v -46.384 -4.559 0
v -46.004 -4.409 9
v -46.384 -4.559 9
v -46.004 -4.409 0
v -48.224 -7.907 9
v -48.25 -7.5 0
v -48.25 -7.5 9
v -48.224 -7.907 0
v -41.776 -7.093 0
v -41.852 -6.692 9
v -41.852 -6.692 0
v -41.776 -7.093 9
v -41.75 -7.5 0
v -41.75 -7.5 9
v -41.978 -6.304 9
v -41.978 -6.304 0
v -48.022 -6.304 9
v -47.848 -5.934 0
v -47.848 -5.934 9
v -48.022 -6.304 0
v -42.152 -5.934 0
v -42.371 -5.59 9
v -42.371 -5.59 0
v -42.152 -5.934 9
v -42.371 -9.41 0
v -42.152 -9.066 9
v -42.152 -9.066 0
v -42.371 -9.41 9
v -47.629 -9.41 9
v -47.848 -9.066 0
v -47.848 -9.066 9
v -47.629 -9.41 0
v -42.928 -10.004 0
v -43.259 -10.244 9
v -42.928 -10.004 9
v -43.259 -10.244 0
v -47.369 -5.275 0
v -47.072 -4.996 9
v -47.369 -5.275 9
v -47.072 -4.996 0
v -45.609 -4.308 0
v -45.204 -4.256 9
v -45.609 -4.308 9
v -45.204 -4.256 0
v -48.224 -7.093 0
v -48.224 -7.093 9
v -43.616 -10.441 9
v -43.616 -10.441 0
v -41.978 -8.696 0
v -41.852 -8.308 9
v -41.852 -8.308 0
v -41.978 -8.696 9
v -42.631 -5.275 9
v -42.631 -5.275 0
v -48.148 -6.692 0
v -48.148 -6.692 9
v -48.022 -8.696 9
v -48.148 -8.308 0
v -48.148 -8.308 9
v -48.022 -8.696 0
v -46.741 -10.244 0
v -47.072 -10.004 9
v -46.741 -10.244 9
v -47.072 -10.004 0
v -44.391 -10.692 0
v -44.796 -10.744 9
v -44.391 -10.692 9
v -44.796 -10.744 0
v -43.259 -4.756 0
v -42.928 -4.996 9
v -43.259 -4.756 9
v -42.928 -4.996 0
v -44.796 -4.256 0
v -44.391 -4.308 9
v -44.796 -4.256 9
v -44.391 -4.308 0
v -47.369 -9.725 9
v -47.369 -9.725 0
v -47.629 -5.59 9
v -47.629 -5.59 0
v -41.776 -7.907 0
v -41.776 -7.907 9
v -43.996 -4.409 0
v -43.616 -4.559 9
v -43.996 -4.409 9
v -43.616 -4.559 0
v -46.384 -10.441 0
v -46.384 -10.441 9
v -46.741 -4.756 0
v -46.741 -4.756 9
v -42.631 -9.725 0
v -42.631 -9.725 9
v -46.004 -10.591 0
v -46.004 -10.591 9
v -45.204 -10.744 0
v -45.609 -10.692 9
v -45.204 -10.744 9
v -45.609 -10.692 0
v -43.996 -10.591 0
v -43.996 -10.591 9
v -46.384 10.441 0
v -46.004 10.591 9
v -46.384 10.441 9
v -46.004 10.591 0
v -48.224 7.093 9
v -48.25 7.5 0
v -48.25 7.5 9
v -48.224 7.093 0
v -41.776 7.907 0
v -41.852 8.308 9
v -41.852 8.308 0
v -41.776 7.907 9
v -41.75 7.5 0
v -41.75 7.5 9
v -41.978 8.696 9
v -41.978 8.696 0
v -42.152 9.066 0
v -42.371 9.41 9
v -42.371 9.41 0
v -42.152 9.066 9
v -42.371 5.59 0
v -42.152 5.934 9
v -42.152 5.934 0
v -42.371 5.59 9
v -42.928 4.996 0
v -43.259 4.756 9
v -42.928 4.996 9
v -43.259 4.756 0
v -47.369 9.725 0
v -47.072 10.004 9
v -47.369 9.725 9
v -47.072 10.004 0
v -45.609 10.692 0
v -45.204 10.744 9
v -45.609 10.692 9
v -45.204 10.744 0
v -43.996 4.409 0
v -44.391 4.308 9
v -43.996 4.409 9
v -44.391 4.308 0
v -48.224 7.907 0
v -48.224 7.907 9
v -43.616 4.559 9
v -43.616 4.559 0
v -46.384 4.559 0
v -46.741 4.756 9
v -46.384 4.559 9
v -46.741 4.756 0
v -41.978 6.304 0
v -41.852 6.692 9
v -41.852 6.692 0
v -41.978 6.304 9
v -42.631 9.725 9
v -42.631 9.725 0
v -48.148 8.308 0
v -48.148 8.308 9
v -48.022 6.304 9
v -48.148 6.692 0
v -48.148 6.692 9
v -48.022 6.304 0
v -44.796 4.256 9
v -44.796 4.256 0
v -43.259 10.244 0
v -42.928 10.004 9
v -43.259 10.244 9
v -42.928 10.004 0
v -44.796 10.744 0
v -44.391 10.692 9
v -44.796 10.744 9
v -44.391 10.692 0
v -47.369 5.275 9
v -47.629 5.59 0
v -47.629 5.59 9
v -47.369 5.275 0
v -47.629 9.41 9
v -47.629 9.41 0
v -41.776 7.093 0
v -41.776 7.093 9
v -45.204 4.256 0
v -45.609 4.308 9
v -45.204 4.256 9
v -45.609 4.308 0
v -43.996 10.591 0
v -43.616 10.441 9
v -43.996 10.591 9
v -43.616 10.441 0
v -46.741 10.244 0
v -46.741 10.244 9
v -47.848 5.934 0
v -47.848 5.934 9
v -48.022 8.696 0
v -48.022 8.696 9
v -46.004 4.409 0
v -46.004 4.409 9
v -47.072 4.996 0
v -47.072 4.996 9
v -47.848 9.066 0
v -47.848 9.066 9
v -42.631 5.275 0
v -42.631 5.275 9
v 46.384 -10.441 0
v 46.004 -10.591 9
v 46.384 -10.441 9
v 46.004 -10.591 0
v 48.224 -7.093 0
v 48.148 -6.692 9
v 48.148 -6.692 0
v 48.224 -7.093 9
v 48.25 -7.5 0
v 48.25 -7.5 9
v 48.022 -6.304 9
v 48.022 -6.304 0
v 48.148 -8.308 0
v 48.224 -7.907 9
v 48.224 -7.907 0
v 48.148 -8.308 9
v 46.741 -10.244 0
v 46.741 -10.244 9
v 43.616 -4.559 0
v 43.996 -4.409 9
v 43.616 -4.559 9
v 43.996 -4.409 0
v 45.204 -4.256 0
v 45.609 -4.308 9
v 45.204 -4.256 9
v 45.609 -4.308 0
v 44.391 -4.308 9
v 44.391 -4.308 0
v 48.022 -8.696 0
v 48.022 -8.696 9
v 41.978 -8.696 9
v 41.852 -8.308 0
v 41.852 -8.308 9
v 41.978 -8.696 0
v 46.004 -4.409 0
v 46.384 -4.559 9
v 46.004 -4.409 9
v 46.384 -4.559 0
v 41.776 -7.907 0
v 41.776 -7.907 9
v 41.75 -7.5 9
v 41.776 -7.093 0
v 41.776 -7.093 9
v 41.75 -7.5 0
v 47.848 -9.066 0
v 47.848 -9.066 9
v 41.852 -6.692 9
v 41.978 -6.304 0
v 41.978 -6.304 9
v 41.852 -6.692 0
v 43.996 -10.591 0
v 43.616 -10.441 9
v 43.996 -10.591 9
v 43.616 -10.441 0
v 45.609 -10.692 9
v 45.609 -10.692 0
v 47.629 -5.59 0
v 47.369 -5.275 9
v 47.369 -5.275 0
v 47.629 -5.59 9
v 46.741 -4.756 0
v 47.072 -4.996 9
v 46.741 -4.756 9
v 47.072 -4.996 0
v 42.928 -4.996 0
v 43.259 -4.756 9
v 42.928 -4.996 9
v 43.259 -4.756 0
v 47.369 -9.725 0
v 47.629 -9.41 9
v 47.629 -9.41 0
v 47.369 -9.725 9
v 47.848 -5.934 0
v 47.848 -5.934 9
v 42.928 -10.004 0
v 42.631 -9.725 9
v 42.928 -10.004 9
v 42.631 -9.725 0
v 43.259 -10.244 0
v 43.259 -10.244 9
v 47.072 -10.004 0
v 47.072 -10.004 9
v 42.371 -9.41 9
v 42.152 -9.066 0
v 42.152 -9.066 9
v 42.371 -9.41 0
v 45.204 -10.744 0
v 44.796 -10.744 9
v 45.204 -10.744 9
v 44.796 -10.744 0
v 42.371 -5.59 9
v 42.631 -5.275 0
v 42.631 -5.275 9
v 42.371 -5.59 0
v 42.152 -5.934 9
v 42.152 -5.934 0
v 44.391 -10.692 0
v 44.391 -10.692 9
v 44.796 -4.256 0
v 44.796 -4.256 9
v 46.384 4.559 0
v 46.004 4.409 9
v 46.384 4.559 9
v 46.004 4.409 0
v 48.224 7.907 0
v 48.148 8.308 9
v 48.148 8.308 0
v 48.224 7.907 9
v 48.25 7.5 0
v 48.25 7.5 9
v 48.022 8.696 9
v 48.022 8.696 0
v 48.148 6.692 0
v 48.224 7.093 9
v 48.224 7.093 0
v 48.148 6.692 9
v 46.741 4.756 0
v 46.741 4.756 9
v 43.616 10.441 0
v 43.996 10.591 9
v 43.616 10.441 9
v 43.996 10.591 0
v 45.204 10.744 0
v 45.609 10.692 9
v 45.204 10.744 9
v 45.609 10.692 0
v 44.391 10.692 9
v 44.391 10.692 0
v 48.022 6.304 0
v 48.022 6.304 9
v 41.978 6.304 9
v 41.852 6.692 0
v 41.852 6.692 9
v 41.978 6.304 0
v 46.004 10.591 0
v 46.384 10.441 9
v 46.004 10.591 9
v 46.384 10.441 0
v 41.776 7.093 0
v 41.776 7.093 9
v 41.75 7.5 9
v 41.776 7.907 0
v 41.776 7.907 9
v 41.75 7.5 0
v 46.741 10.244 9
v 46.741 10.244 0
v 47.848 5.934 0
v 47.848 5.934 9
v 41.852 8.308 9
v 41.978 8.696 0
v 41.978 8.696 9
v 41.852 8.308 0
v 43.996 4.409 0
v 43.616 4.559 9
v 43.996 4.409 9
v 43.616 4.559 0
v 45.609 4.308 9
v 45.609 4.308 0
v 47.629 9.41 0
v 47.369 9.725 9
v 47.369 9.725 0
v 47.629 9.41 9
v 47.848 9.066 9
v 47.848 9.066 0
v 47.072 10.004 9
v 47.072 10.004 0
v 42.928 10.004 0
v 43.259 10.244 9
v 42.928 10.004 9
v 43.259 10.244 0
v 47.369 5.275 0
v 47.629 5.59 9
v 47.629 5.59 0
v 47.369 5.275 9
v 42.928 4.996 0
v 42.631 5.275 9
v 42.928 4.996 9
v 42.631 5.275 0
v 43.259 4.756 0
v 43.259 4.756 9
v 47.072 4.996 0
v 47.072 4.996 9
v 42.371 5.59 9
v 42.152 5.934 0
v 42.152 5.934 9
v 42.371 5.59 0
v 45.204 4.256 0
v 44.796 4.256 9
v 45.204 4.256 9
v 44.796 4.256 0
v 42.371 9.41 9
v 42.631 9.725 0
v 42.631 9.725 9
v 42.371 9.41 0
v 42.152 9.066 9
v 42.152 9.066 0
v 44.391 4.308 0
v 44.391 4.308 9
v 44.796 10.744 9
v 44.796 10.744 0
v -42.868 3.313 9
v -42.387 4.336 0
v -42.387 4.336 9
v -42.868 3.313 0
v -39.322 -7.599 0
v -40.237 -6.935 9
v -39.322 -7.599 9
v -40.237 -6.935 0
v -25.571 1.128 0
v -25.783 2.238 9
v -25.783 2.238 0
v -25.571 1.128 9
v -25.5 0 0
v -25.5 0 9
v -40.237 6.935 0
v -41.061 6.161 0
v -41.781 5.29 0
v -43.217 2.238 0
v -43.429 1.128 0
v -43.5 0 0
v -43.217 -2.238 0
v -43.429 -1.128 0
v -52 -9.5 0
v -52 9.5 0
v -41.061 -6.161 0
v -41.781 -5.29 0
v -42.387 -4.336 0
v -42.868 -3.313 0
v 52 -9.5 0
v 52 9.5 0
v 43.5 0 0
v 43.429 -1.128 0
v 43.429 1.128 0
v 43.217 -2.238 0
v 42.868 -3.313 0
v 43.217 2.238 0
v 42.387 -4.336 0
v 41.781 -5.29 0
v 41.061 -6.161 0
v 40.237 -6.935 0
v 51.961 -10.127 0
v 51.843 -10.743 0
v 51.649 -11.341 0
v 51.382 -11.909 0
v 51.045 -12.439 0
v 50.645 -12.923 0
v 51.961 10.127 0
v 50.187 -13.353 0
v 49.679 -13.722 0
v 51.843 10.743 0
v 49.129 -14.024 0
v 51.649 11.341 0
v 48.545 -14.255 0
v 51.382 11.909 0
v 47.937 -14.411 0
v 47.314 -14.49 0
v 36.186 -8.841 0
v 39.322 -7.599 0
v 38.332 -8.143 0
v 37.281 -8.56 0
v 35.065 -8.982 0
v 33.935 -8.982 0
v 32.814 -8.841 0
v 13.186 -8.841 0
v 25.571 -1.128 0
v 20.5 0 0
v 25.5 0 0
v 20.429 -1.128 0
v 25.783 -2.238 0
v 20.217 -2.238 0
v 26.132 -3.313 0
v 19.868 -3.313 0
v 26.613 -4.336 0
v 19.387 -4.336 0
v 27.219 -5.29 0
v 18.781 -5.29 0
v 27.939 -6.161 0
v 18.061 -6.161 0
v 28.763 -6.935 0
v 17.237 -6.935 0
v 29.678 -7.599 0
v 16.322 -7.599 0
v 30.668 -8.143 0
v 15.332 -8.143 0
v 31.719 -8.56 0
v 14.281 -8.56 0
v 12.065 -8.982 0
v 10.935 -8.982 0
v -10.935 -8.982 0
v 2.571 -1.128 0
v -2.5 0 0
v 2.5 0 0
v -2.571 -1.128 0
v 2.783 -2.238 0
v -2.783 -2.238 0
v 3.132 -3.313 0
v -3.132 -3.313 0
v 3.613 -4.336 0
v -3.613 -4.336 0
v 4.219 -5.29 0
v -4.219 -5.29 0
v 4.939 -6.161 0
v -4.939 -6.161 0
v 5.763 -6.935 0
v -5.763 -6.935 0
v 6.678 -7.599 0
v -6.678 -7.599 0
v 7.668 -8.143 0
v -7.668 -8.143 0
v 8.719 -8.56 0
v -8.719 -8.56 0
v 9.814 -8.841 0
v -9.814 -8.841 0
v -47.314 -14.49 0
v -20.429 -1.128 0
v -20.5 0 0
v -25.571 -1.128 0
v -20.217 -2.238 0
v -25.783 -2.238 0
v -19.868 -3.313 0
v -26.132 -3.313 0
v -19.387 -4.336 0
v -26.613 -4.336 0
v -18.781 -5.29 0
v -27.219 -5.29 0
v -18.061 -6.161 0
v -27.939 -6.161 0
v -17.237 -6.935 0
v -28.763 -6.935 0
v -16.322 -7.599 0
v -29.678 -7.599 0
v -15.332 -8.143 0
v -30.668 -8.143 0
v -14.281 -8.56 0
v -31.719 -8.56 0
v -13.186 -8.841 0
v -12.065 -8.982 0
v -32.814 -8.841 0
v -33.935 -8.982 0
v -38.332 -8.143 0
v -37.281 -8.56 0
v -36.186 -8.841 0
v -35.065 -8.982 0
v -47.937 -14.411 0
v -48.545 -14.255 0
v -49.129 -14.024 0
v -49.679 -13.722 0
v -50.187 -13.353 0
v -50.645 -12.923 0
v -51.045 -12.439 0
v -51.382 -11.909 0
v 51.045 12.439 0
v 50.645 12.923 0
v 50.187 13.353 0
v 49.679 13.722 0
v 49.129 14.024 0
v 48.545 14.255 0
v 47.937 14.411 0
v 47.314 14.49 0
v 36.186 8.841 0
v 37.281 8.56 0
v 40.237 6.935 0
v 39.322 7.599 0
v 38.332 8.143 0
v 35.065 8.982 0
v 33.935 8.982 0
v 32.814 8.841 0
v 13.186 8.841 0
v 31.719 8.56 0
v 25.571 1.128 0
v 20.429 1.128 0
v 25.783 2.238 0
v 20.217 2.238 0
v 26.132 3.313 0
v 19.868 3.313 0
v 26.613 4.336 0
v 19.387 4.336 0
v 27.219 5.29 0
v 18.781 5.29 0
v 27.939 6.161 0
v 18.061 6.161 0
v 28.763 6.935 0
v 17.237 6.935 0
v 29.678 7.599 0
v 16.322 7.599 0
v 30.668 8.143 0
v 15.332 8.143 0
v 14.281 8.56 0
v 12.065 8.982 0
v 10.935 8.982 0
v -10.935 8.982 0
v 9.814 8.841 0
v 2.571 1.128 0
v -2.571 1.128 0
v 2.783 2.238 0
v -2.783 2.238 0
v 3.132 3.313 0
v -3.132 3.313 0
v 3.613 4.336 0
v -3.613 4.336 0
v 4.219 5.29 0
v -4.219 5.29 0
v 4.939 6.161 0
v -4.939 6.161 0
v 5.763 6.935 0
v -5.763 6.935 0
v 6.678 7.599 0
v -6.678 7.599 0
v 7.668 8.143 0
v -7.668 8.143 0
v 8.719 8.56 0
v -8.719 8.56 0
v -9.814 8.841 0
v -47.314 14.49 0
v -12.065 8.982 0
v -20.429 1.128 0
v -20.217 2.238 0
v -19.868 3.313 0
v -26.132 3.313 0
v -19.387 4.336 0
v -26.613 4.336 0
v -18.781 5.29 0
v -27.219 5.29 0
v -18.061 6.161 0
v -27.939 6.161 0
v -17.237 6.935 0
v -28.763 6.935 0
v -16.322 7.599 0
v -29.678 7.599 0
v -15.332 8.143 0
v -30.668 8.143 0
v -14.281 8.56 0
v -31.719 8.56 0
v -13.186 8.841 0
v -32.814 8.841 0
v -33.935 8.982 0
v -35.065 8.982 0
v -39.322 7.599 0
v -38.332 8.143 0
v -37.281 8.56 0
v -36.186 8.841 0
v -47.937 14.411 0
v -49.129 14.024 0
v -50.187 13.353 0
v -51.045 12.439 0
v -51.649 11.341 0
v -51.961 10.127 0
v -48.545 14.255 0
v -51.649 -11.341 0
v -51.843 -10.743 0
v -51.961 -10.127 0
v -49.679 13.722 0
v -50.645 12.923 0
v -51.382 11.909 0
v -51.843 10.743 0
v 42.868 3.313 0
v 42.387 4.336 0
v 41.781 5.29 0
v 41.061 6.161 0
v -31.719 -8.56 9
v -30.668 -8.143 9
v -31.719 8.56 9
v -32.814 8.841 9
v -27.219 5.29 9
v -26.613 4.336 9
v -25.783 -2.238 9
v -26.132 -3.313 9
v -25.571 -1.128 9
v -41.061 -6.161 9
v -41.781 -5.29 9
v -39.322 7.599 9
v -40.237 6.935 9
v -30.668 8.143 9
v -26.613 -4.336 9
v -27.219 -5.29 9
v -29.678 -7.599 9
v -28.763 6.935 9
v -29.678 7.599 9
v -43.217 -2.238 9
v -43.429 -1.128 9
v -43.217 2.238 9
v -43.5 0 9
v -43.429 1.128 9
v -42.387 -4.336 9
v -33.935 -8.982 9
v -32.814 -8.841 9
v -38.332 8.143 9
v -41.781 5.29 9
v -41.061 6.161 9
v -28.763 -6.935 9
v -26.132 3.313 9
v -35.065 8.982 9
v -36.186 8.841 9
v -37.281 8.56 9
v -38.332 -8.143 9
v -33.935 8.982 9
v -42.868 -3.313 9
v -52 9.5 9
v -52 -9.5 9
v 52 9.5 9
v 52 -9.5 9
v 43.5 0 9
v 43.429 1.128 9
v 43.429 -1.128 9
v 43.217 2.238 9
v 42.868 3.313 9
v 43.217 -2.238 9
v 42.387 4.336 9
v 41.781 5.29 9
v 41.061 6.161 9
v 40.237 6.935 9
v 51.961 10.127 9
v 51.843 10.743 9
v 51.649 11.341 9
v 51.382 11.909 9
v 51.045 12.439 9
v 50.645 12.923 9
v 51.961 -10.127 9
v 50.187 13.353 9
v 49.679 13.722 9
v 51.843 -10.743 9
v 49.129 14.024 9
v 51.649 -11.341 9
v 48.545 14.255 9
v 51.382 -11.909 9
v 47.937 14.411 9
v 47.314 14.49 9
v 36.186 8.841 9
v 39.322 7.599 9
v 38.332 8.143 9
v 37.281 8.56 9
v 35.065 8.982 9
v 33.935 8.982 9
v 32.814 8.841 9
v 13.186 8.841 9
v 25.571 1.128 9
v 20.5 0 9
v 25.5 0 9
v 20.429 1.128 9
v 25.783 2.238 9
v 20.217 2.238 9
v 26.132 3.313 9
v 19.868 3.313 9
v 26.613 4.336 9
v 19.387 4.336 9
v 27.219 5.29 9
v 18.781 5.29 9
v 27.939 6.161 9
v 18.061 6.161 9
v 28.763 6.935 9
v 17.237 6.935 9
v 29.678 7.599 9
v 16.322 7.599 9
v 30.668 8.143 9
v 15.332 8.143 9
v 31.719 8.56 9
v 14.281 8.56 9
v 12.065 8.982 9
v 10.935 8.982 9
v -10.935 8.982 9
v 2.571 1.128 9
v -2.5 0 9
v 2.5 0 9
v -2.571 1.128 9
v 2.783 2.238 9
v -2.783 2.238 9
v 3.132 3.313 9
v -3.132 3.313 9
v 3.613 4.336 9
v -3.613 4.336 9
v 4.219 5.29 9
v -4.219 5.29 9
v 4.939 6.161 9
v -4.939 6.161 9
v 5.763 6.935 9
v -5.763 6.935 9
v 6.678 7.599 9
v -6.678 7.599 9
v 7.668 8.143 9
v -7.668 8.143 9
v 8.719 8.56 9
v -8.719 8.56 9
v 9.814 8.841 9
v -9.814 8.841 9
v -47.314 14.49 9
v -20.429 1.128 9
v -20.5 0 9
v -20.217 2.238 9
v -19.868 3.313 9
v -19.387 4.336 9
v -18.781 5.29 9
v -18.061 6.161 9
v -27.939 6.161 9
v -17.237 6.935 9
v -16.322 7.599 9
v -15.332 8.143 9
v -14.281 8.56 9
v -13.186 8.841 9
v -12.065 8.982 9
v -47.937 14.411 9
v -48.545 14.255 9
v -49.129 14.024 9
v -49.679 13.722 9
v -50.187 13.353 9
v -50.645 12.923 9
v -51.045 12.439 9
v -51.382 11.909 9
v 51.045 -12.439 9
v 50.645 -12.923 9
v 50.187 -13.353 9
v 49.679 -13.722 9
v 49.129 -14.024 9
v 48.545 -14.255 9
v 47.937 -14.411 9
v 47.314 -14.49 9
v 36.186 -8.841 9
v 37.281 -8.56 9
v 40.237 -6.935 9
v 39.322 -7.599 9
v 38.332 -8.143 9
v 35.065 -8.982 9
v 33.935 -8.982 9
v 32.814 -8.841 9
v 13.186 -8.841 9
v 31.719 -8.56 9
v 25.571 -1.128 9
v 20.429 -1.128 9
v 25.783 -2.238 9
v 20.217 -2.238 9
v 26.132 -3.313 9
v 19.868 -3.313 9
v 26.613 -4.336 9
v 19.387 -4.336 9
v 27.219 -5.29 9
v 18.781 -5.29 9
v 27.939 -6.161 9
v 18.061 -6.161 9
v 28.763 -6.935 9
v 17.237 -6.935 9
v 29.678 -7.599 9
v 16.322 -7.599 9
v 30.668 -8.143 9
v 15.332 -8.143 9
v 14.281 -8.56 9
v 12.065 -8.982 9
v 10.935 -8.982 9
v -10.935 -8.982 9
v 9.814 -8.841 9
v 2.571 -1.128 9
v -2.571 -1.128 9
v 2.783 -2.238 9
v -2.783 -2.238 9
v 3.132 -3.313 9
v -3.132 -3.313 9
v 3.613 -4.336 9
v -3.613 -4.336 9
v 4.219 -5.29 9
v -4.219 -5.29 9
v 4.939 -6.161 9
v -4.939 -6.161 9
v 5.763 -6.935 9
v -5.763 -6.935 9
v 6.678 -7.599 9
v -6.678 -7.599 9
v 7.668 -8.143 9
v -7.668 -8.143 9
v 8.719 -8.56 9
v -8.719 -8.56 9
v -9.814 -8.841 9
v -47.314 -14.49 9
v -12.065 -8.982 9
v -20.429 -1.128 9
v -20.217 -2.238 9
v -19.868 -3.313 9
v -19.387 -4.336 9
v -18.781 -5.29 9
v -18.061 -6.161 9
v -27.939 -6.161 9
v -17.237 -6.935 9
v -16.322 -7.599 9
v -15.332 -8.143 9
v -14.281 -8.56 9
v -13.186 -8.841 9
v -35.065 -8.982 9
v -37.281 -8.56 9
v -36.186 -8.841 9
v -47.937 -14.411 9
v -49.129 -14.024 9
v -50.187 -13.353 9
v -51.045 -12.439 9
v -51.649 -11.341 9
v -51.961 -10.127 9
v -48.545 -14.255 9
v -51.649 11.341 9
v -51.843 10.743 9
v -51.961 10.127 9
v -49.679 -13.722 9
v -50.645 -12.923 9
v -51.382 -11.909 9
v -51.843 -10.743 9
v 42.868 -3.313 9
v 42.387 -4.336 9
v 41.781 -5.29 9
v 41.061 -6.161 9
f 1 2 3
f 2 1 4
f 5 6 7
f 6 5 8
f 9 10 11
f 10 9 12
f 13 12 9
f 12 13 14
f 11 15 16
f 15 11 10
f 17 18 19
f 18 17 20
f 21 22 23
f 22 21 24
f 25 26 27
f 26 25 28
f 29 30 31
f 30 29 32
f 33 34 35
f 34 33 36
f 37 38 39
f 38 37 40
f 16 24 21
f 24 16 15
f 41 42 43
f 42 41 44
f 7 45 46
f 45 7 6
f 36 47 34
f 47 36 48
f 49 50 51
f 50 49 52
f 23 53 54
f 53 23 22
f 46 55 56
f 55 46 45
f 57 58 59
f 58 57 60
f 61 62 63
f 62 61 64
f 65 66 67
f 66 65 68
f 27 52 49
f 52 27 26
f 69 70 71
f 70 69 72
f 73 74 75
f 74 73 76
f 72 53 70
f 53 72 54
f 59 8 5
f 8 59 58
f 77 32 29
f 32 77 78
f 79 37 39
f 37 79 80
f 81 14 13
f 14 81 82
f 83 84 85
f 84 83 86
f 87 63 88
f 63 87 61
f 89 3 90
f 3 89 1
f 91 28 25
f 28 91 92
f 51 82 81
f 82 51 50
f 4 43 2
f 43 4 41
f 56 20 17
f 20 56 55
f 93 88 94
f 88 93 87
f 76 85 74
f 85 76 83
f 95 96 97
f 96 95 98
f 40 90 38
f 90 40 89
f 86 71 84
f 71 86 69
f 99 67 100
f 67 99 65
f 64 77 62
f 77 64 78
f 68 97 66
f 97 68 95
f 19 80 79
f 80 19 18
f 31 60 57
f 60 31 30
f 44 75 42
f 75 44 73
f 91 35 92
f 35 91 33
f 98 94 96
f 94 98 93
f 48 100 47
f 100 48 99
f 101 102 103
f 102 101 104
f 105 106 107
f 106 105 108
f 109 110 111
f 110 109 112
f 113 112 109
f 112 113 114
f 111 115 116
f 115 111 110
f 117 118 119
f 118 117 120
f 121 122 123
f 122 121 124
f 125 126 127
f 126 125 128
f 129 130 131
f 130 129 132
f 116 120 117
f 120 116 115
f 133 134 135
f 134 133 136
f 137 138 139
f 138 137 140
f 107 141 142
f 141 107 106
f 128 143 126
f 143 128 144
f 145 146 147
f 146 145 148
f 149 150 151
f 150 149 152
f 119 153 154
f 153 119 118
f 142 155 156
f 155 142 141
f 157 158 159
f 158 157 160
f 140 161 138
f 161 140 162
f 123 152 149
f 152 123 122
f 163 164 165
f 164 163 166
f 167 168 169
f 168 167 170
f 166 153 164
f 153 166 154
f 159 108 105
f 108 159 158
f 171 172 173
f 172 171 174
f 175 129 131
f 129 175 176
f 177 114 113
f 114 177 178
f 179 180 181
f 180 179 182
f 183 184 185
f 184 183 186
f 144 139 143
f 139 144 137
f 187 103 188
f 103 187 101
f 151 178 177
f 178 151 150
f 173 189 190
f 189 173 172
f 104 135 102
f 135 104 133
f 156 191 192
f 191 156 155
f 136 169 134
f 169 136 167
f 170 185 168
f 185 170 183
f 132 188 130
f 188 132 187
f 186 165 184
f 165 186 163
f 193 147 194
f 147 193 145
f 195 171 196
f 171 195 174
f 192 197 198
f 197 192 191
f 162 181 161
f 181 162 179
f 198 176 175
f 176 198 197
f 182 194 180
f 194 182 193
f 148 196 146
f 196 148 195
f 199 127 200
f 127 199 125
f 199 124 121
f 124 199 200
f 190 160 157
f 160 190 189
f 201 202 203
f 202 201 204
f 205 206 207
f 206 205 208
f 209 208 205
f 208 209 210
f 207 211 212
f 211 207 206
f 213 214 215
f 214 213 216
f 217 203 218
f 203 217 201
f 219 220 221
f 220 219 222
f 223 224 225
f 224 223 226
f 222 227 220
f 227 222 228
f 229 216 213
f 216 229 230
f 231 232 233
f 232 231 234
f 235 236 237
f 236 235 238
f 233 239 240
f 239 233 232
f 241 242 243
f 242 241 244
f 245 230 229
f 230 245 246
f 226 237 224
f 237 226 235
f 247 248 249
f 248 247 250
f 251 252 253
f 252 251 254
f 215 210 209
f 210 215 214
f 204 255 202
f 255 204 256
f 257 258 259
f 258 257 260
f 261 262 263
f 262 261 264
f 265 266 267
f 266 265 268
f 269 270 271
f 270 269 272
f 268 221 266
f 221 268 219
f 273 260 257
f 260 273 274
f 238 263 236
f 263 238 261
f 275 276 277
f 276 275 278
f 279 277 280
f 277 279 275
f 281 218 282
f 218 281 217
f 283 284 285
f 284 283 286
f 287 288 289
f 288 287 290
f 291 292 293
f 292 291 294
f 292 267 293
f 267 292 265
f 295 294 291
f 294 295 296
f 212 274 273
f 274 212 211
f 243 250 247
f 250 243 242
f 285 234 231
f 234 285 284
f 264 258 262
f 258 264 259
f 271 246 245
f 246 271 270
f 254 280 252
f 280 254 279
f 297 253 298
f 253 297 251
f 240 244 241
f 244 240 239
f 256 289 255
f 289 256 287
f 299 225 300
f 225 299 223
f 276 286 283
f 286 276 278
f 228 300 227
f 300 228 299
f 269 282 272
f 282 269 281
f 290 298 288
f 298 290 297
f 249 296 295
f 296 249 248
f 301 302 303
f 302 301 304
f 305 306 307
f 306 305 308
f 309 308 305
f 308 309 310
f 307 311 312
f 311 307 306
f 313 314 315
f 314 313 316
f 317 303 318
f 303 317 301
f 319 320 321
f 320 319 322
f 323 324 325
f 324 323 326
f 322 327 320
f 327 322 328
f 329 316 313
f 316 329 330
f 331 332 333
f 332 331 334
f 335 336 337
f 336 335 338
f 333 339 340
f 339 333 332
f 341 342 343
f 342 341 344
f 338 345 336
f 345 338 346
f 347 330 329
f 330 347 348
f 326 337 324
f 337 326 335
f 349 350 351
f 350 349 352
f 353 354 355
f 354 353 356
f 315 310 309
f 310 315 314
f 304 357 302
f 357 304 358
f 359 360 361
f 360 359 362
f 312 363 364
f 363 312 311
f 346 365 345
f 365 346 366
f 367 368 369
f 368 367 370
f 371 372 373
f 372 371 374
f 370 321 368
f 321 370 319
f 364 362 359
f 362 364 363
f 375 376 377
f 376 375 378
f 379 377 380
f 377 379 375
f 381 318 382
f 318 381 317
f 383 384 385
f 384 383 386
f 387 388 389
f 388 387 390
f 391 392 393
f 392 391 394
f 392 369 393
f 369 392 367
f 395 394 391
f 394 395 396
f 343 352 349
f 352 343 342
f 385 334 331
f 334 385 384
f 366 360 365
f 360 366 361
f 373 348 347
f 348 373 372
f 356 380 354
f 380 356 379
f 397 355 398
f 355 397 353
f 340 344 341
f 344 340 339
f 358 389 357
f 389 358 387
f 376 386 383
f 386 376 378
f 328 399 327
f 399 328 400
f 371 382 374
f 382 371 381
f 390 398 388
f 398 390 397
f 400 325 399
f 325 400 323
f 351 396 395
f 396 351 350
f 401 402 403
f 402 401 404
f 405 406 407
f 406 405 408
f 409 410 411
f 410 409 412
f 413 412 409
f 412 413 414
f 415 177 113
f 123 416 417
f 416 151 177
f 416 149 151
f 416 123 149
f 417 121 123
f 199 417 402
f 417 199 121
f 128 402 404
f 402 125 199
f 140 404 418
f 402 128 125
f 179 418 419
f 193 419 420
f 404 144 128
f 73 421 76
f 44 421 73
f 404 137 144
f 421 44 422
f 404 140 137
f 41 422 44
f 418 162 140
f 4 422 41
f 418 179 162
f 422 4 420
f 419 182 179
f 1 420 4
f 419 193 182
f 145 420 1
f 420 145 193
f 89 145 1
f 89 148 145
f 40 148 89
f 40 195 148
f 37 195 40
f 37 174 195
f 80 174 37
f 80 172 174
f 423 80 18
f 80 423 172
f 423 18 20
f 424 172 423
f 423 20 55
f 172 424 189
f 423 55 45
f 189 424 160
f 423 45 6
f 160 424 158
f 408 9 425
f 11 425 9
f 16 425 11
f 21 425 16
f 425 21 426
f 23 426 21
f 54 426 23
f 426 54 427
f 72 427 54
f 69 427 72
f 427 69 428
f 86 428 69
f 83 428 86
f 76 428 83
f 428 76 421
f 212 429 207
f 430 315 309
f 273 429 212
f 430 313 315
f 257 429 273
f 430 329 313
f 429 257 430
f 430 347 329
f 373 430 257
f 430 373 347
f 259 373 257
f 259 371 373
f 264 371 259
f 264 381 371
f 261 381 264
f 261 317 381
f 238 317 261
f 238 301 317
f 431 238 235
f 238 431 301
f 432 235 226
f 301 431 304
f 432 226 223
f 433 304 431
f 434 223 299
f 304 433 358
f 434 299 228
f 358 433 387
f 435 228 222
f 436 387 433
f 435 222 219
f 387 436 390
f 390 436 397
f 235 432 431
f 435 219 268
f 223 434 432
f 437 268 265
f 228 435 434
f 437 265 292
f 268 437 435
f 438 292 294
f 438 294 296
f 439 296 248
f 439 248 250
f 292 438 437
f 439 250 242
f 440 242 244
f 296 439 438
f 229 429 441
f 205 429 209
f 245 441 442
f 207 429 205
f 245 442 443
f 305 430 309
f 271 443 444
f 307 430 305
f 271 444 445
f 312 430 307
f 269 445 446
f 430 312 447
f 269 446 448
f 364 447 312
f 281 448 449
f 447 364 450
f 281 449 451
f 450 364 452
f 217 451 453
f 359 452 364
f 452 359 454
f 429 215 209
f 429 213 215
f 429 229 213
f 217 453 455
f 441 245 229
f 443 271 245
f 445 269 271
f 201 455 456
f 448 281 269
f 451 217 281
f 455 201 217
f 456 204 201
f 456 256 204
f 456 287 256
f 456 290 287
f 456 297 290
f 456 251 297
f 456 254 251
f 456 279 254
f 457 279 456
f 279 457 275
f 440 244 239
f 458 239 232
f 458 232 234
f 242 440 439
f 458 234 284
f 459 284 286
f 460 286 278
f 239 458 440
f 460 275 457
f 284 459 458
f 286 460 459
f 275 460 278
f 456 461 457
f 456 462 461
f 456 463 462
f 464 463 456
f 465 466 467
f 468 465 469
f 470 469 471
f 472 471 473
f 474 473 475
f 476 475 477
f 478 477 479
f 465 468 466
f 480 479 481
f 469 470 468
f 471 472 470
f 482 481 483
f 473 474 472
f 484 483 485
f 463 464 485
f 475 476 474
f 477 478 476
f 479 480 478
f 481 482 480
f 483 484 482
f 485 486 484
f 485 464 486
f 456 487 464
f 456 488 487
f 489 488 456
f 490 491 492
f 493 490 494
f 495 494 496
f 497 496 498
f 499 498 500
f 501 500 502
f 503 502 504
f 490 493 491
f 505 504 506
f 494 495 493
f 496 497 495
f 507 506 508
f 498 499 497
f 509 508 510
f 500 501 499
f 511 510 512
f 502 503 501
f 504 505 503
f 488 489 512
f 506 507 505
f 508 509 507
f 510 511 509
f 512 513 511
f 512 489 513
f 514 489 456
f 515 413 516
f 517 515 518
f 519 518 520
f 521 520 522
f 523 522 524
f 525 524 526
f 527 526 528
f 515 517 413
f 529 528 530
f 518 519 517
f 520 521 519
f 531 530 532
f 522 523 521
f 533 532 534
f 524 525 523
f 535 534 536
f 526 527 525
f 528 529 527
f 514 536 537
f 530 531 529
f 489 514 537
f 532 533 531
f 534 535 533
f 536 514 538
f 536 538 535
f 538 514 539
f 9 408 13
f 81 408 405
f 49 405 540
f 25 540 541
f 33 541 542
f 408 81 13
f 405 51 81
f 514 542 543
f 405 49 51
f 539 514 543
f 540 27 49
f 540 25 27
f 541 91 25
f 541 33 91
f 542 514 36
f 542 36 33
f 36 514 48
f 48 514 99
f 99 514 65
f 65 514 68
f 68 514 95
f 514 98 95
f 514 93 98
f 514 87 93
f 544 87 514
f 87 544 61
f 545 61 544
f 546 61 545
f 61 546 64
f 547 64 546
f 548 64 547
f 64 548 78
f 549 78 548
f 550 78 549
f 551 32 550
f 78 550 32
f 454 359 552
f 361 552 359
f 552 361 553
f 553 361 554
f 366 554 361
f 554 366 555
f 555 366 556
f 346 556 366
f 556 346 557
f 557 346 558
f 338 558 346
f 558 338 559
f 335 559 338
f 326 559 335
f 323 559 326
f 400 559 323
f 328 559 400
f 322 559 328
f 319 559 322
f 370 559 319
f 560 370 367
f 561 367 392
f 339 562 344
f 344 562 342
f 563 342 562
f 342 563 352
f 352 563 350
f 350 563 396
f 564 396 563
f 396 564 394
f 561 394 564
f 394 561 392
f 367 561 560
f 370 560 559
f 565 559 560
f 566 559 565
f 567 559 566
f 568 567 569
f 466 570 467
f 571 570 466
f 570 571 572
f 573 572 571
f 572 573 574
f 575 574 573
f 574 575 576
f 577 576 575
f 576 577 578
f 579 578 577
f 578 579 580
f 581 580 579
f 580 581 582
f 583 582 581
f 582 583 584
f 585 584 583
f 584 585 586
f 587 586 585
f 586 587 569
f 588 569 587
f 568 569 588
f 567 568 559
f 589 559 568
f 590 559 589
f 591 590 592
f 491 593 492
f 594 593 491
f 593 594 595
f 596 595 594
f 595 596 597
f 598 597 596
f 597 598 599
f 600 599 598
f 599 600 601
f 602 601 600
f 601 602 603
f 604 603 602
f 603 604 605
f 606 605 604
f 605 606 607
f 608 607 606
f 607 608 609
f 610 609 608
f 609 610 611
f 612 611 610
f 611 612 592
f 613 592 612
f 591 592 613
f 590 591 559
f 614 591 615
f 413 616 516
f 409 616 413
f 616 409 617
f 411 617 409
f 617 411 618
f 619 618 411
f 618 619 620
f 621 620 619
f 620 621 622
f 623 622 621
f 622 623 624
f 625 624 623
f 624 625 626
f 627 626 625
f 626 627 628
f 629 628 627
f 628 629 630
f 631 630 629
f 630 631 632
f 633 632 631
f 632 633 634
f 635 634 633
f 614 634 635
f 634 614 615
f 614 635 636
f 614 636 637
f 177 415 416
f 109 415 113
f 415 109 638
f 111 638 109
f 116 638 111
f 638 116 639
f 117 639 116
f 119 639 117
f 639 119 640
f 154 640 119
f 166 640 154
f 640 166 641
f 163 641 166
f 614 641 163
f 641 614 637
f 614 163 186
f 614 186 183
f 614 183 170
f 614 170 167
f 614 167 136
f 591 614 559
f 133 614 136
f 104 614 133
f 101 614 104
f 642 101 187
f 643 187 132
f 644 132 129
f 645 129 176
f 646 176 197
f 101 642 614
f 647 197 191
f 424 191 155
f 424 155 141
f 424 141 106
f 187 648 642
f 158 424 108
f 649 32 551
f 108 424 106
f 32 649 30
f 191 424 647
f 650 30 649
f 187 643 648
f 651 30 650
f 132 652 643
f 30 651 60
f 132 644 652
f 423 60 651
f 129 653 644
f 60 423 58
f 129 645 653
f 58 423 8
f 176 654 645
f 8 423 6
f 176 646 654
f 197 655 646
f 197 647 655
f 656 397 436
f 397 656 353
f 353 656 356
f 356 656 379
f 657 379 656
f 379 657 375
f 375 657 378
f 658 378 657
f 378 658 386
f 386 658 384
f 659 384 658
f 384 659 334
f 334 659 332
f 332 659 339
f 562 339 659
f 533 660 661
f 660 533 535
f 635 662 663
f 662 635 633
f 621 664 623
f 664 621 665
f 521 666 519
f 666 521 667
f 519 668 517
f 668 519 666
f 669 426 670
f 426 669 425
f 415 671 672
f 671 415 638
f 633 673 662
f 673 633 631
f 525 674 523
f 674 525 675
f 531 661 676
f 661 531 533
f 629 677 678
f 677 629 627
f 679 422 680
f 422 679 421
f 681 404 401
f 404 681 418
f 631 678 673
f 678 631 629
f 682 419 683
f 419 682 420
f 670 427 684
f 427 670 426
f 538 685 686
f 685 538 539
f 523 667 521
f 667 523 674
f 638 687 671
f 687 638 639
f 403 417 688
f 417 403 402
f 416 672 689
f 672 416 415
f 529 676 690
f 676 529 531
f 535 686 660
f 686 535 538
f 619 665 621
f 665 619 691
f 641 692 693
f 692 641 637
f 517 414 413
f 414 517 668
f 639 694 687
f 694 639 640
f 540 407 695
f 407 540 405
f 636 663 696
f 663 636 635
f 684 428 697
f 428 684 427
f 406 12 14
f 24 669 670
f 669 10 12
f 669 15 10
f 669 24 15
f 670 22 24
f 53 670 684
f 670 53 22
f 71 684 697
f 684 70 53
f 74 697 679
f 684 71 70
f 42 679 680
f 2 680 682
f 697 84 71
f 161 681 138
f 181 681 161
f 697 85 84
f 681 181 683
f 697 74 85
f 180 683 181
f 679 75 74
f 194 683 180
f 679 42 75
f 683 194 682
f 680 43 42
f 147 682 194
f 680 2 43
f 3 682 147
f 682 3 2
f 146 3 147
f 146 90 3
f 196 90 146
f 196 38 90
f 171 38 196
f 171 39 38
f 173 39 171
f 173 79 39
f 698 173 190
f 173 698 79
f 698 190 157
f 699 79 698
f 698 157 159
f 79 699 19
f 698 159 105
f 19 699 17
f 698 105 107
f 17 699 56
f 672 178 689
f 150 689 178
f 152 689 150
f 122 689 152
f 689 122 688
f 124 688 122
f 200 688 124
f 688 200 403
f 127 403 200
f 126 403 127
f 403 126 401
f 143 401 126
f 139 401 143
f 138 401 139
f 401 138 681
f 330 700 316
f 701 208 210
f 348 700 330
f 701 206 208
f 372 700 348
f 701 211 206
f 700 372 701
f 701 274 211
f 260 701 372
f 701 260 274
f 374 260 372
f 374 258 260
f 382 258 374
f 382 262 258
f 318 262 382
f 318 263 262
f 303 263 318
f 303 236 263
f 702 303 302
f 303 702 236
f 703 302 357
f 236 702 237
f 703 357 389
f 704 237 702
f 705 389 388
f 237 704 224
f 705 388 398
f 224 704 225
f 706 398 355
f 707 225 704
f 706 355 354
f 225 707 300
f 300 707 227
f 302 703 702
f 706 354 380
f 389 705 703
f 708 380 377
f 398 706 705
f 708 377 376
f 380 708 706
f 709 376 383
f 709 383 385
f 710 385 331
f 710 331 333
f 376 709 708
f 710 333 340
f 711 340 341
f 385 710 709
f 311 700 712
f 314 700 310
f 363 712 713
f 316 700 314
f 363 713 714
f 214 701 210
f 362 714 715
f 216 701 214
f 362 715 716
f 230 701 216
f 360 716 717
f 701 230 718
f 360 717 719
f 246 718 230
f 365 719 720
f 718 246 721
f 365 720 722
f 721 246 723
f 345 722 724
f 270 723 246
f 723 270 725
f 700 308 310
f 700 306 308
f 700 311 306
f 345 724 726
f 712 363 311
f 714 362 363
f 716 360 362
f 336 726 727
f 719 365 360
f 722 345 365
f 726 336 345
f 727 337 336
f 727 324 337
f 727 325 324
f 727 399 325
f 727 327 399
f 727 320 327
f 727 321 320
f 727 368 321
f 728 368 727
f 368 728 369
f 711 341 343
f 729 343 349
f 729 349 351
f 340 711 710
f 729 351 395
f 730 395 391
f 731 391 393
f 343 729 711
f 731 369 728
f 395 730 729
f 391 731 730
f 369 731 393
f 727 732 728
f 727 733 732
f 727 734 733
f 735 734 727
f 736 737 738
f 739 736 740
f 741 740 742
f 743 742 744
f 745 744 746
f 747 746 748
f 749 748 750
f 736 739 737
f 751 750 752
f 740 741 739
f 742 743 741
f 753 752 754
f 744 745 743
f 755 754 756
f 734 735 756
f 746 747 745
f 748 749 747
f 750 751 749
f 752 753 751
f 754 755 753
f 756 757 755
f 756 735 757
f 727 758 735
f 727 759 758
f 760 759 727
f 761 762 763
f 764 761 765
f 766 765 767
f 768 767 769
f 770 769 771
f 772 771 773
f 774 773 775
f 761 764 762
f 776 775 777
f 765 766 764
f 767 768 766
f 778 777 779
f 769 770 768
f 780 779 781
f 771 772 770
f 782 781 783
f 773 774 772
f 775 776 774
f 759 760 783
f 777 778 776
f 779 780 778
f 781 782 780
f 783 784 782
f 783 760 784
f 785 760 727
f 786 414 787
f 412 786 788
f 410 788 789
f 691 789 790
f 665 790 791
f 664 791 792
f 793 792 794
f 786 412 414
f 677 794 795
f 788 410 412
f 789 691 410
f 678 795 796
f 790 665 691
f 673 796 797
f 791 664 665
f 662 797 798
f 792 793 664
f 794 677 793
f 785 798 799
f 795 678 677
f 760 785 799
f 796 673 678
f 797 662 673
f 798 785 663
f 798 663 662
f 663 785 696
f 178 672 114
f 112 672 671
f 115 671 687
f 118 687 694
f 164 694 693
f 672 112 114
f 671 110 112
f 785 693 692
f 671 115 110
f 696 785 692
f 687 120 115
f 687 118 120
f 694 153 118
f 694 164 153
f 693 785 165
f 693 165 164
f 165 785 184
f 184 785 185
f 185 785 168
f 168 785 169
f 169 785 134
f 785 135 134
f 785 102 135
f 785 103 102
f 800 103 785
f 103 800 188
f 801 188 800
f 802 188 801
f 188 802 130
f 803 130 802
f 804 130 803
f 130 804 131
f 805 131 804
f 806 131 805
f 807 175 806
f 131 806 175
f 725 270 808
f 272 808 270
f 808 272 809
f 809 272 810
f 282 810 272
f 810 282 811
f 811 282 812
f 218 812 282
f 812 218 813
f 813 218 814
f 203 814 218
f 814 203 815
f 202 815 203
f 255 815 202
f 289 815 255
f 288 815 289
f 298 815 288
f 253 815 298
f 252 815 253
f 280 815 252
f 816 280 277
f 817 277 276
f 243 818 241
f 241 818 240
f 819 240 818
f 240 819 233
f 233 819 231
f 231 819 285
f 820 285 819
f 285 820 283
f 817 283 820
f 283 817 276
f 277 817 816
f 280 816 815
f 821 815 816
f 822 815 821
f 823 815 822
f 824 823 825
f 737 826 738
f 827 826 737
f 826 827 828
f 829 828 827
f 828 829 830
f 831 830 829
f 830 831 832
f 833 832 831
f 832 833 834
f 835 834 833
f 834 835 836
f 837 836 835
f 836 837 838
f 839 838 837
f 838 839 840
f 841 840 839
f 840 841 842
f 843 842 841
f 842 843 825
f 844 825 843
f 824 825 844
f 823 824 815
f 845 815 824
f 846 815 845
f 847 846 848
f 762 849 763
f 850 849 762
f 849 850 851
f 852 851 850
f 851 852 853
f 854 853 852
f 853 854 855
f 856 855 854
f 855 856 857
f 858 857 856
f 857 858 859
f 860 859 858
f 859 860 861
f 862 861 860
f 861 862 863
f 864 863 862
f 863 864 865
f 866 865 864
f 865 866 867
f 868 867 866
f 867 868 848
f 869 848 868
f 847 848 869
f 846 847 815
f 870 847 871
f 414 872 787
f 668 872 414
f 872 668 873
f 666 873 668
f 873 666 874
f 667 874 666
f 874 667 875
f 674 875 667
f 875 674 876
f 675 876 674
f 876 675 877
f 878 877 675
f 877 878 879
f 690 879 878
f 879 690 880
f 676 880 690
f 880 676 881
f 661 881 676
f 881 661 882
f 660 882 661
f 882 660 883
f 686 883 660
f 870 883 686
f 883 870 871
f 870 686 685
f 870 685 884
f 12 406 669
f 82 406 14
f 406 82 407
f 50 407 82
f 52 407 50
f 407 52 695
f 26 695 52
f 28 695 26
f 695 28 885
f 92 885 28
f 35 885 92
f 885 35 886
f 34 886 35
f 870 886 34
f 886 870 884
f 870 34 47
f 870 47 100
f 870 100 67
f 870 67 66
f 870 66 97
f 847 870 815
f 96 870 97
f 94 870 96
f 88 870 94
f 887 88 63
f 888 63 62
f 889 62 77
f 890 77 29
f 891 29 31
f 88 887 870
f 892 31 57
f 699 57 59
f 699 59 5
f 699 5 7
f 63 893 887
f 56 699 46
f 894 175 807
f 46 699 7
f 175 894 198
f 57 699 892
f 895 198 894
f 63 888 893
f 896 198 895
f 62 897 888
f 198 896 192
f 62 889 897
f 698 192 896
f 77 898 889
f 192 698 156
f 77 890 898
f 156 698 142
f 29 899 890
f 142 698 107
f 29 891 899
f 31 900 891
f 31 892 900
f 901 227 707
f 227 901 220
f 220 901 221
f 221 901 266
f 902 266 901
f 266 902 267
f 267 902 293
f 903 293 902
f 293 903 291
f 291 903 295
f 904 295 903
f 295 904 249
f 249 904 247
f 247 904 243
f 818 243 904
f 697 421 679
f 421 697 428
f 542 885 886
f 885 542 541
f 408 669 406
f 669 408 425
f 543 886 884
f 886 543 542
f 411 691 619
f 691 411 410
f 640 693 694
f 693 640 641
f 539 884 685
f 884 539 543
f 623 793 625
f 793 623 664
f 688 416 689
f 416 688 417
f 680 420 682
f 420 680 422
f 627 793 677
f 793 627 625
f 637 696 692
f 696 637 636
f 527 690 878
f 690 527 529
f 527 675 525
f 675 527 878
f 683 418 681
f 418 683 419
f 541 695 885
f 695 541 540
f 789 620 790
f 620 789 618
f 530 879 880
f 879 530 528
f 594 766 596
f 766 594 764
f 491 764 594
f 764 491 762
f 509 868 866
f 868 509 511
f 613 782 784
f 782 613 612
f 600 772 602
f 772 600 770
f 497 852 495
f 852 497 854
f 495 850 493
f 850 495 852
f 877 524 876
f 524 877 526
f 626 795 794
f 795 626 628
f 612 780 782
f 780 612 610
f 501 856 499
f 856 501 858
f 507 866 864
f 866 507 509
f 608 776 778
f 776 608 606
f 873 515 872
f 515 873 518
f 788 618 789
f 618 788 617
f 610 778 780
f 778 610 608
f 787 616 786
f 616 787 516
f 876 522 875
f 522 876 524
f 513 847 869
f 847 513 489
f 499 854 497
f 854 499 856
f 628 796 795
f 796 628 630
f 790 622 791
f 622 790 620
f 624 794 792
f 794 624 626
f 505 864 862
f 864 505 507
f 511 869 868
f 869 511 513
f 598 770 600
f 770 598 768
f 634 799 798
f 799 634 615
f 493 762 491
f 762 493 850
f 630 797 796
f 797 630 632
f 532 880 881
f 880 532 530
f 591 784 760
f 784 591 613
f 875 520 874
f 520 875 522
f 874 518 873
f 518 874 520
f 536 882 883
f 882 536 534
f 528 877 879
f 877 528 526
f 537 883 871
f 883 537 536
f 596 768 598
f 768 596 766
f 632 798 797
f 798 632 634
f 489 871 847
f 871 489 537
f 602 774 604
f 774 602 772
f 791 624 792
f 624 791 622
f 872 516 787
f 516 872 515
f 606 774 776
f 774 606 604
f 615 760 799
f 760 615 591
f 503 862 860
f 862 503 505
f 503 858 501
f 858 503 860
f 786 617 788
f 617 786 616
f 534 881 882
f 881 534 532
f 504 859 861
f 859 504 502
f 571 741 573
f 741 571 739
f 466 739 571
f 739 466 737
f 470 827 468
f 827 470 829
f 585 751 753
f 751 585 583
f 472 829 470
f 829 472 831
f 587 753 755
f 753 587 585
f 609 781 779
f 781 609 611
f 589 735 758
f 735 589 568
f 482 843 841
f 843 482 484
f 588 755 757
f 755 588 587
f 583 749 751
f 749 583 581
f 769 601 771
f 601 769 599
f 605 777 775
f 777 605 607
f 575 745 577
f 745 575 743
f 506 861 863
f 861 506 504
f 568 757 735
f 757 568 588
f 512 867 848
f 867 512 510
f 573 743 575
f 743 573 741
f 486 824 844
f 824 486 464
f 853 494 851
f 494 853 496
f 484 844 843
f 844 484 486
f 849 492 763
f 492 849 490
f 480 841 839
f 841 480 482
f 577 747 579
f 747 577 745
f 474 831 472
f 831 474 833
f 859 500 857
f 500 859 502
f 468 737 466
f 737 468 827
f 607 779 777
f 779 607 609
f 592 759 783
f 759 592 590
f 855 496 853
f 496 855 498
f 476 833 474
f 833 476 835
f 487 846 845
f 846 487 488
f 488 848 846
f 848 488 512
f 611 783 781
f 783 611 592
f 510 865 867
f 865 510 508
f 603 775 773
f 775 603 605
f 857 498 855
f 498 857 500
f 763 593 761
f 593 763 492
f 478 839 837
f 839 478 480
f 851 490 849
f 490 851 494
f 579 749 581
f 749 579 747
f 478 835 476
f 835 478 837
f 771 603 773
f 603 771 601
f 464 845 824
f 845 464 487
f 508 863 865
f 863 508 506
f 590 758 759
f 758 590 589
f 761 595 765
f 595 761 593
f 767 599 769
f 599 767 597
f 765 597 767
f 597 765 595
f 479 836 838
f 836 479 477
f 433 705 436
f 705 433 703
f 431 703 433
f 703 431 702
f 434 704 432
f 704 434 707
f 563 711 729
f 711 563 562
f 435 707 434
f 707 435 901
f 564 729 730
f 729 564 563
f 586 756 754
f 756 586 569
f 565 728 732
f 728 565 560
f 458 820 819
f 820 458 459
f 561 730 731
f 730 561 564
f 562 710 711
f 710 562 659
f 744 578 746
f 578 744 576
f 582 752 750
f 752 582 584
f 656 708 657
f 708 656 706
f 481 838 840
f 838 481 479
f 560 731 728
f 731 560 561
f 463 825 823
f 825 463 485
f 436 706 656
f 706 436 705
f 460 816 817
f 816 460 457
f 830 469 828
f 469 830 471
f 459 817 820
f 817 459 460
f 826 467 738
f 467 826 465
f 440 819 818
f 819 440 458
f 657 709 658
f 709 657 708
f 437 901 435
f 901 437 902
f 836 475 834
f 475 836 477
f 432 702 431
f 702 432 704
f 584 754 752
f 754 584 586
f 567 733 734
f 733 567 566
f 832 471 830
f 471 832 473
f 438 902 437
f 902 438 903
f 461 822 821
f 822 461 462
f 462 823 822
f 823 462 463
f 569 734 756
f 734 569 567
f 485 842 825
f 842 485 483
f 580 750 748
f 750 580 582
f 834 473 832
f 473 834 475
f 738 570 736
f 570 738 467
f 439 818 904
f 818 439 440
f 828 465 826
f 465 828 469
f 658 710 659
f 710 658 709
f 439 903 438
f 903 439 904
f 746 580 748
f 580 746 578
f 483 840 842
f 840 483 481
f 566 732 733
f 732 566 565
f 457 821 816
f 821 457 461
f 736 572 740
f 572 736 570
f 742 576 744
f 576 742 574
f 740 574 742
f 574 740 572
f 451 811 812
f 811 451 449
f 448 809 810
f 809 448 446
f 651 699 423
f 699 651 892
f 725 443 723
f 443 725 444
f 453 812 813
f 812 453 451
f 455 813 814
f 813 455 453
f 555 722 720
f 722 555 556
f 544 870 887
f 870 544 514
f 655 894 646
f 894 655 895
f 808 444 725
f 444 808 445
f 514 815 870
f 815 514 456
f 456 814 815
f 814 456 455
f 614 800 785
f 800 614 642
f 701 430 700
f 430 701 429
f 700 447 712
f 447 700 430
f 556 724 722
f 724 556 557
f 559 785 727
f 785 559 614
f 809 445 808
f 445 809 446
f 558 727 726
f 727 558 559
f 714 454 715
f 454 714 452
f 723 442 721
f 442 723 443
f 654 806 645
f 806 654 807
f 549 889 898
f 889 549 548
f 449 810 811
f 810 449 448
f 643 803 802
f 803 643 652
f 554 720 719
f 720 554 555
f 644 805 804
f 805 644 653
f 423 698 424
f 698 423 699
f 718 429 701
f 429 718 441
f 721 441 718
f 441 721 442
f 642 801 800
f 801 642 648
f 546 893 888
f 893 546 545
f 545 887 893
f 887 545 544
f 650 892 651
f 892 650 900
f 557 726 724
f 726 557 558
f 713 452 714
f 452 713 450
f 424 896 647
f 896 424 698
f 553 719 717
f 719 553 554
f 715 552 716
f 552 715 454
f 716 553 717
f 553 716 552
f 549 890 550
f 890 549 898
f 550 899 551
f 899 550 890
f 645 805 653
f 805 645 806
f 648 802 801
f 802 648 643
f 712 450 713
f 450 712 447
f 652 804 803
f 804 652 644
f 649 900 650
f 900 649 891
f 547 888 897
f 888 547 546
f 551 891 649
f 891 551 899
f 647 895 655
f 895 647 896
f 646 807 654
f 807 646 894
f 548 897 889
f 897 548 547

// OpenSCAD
$fn = 50;


difference() {
	union() {
		hull() {
			translate(v = [-47.0000000000, 9.5000000000, 0]) {
				cylinder(h = 9, r = 5);
			}
			translate(v = [47.0000000000, 9.5000000000, 0]) {
				cylinder(h = 9, r = 5);
			}
			translate(v = [-47.0000000000, -9.5000000000, 0]) {
				cylinder(h = 9, r = 5);
			}
			translate(v = [47.0000000000, -9.5000000000, 0]) {
				cylinder(h = 9, r = 5);
			}
		}
	}
	union() {
		#translate(v = [-45.0000000000, -7.5000000000, -100.0000000000]) {
			cylinder(h = 200, r = 3.2500000000);
		}
		#translate(v = [-45.0000000000, 7.5000000000, -100.0000000000]) {
			cylinder(h = 200, r = 3.2500000000);
		}
		#translate(v = [45.0000000000, -7.5000000000, -100.0000000000]) {
			cylinder(h = 200, r = 3.2500000000);
		}
		#translate(v = [45.0000000000, 7.5000000000, -100.0000000000]) {
			cylinder(h = 200, r = 3.2500000000);
		}
		#translate(v = [-34.5000000000, 0, 0]) {
			cylinder(h = 9, r = 9.0000000000);
		}
		#translate(v = [-11.5000000000, 0, 0]) {
			cylinder(h = 9, r = 9.0000000000);
		}
		#translate(v = [11.5000000000, 0, 0]) {
			cylinder(h = 9, r = 9.0000000000);
		}
		#translate(v = [34.5000000000, 0, 0]) {
			cylinder(h = 9, r = 9.0000000000);
		}
	}
}
